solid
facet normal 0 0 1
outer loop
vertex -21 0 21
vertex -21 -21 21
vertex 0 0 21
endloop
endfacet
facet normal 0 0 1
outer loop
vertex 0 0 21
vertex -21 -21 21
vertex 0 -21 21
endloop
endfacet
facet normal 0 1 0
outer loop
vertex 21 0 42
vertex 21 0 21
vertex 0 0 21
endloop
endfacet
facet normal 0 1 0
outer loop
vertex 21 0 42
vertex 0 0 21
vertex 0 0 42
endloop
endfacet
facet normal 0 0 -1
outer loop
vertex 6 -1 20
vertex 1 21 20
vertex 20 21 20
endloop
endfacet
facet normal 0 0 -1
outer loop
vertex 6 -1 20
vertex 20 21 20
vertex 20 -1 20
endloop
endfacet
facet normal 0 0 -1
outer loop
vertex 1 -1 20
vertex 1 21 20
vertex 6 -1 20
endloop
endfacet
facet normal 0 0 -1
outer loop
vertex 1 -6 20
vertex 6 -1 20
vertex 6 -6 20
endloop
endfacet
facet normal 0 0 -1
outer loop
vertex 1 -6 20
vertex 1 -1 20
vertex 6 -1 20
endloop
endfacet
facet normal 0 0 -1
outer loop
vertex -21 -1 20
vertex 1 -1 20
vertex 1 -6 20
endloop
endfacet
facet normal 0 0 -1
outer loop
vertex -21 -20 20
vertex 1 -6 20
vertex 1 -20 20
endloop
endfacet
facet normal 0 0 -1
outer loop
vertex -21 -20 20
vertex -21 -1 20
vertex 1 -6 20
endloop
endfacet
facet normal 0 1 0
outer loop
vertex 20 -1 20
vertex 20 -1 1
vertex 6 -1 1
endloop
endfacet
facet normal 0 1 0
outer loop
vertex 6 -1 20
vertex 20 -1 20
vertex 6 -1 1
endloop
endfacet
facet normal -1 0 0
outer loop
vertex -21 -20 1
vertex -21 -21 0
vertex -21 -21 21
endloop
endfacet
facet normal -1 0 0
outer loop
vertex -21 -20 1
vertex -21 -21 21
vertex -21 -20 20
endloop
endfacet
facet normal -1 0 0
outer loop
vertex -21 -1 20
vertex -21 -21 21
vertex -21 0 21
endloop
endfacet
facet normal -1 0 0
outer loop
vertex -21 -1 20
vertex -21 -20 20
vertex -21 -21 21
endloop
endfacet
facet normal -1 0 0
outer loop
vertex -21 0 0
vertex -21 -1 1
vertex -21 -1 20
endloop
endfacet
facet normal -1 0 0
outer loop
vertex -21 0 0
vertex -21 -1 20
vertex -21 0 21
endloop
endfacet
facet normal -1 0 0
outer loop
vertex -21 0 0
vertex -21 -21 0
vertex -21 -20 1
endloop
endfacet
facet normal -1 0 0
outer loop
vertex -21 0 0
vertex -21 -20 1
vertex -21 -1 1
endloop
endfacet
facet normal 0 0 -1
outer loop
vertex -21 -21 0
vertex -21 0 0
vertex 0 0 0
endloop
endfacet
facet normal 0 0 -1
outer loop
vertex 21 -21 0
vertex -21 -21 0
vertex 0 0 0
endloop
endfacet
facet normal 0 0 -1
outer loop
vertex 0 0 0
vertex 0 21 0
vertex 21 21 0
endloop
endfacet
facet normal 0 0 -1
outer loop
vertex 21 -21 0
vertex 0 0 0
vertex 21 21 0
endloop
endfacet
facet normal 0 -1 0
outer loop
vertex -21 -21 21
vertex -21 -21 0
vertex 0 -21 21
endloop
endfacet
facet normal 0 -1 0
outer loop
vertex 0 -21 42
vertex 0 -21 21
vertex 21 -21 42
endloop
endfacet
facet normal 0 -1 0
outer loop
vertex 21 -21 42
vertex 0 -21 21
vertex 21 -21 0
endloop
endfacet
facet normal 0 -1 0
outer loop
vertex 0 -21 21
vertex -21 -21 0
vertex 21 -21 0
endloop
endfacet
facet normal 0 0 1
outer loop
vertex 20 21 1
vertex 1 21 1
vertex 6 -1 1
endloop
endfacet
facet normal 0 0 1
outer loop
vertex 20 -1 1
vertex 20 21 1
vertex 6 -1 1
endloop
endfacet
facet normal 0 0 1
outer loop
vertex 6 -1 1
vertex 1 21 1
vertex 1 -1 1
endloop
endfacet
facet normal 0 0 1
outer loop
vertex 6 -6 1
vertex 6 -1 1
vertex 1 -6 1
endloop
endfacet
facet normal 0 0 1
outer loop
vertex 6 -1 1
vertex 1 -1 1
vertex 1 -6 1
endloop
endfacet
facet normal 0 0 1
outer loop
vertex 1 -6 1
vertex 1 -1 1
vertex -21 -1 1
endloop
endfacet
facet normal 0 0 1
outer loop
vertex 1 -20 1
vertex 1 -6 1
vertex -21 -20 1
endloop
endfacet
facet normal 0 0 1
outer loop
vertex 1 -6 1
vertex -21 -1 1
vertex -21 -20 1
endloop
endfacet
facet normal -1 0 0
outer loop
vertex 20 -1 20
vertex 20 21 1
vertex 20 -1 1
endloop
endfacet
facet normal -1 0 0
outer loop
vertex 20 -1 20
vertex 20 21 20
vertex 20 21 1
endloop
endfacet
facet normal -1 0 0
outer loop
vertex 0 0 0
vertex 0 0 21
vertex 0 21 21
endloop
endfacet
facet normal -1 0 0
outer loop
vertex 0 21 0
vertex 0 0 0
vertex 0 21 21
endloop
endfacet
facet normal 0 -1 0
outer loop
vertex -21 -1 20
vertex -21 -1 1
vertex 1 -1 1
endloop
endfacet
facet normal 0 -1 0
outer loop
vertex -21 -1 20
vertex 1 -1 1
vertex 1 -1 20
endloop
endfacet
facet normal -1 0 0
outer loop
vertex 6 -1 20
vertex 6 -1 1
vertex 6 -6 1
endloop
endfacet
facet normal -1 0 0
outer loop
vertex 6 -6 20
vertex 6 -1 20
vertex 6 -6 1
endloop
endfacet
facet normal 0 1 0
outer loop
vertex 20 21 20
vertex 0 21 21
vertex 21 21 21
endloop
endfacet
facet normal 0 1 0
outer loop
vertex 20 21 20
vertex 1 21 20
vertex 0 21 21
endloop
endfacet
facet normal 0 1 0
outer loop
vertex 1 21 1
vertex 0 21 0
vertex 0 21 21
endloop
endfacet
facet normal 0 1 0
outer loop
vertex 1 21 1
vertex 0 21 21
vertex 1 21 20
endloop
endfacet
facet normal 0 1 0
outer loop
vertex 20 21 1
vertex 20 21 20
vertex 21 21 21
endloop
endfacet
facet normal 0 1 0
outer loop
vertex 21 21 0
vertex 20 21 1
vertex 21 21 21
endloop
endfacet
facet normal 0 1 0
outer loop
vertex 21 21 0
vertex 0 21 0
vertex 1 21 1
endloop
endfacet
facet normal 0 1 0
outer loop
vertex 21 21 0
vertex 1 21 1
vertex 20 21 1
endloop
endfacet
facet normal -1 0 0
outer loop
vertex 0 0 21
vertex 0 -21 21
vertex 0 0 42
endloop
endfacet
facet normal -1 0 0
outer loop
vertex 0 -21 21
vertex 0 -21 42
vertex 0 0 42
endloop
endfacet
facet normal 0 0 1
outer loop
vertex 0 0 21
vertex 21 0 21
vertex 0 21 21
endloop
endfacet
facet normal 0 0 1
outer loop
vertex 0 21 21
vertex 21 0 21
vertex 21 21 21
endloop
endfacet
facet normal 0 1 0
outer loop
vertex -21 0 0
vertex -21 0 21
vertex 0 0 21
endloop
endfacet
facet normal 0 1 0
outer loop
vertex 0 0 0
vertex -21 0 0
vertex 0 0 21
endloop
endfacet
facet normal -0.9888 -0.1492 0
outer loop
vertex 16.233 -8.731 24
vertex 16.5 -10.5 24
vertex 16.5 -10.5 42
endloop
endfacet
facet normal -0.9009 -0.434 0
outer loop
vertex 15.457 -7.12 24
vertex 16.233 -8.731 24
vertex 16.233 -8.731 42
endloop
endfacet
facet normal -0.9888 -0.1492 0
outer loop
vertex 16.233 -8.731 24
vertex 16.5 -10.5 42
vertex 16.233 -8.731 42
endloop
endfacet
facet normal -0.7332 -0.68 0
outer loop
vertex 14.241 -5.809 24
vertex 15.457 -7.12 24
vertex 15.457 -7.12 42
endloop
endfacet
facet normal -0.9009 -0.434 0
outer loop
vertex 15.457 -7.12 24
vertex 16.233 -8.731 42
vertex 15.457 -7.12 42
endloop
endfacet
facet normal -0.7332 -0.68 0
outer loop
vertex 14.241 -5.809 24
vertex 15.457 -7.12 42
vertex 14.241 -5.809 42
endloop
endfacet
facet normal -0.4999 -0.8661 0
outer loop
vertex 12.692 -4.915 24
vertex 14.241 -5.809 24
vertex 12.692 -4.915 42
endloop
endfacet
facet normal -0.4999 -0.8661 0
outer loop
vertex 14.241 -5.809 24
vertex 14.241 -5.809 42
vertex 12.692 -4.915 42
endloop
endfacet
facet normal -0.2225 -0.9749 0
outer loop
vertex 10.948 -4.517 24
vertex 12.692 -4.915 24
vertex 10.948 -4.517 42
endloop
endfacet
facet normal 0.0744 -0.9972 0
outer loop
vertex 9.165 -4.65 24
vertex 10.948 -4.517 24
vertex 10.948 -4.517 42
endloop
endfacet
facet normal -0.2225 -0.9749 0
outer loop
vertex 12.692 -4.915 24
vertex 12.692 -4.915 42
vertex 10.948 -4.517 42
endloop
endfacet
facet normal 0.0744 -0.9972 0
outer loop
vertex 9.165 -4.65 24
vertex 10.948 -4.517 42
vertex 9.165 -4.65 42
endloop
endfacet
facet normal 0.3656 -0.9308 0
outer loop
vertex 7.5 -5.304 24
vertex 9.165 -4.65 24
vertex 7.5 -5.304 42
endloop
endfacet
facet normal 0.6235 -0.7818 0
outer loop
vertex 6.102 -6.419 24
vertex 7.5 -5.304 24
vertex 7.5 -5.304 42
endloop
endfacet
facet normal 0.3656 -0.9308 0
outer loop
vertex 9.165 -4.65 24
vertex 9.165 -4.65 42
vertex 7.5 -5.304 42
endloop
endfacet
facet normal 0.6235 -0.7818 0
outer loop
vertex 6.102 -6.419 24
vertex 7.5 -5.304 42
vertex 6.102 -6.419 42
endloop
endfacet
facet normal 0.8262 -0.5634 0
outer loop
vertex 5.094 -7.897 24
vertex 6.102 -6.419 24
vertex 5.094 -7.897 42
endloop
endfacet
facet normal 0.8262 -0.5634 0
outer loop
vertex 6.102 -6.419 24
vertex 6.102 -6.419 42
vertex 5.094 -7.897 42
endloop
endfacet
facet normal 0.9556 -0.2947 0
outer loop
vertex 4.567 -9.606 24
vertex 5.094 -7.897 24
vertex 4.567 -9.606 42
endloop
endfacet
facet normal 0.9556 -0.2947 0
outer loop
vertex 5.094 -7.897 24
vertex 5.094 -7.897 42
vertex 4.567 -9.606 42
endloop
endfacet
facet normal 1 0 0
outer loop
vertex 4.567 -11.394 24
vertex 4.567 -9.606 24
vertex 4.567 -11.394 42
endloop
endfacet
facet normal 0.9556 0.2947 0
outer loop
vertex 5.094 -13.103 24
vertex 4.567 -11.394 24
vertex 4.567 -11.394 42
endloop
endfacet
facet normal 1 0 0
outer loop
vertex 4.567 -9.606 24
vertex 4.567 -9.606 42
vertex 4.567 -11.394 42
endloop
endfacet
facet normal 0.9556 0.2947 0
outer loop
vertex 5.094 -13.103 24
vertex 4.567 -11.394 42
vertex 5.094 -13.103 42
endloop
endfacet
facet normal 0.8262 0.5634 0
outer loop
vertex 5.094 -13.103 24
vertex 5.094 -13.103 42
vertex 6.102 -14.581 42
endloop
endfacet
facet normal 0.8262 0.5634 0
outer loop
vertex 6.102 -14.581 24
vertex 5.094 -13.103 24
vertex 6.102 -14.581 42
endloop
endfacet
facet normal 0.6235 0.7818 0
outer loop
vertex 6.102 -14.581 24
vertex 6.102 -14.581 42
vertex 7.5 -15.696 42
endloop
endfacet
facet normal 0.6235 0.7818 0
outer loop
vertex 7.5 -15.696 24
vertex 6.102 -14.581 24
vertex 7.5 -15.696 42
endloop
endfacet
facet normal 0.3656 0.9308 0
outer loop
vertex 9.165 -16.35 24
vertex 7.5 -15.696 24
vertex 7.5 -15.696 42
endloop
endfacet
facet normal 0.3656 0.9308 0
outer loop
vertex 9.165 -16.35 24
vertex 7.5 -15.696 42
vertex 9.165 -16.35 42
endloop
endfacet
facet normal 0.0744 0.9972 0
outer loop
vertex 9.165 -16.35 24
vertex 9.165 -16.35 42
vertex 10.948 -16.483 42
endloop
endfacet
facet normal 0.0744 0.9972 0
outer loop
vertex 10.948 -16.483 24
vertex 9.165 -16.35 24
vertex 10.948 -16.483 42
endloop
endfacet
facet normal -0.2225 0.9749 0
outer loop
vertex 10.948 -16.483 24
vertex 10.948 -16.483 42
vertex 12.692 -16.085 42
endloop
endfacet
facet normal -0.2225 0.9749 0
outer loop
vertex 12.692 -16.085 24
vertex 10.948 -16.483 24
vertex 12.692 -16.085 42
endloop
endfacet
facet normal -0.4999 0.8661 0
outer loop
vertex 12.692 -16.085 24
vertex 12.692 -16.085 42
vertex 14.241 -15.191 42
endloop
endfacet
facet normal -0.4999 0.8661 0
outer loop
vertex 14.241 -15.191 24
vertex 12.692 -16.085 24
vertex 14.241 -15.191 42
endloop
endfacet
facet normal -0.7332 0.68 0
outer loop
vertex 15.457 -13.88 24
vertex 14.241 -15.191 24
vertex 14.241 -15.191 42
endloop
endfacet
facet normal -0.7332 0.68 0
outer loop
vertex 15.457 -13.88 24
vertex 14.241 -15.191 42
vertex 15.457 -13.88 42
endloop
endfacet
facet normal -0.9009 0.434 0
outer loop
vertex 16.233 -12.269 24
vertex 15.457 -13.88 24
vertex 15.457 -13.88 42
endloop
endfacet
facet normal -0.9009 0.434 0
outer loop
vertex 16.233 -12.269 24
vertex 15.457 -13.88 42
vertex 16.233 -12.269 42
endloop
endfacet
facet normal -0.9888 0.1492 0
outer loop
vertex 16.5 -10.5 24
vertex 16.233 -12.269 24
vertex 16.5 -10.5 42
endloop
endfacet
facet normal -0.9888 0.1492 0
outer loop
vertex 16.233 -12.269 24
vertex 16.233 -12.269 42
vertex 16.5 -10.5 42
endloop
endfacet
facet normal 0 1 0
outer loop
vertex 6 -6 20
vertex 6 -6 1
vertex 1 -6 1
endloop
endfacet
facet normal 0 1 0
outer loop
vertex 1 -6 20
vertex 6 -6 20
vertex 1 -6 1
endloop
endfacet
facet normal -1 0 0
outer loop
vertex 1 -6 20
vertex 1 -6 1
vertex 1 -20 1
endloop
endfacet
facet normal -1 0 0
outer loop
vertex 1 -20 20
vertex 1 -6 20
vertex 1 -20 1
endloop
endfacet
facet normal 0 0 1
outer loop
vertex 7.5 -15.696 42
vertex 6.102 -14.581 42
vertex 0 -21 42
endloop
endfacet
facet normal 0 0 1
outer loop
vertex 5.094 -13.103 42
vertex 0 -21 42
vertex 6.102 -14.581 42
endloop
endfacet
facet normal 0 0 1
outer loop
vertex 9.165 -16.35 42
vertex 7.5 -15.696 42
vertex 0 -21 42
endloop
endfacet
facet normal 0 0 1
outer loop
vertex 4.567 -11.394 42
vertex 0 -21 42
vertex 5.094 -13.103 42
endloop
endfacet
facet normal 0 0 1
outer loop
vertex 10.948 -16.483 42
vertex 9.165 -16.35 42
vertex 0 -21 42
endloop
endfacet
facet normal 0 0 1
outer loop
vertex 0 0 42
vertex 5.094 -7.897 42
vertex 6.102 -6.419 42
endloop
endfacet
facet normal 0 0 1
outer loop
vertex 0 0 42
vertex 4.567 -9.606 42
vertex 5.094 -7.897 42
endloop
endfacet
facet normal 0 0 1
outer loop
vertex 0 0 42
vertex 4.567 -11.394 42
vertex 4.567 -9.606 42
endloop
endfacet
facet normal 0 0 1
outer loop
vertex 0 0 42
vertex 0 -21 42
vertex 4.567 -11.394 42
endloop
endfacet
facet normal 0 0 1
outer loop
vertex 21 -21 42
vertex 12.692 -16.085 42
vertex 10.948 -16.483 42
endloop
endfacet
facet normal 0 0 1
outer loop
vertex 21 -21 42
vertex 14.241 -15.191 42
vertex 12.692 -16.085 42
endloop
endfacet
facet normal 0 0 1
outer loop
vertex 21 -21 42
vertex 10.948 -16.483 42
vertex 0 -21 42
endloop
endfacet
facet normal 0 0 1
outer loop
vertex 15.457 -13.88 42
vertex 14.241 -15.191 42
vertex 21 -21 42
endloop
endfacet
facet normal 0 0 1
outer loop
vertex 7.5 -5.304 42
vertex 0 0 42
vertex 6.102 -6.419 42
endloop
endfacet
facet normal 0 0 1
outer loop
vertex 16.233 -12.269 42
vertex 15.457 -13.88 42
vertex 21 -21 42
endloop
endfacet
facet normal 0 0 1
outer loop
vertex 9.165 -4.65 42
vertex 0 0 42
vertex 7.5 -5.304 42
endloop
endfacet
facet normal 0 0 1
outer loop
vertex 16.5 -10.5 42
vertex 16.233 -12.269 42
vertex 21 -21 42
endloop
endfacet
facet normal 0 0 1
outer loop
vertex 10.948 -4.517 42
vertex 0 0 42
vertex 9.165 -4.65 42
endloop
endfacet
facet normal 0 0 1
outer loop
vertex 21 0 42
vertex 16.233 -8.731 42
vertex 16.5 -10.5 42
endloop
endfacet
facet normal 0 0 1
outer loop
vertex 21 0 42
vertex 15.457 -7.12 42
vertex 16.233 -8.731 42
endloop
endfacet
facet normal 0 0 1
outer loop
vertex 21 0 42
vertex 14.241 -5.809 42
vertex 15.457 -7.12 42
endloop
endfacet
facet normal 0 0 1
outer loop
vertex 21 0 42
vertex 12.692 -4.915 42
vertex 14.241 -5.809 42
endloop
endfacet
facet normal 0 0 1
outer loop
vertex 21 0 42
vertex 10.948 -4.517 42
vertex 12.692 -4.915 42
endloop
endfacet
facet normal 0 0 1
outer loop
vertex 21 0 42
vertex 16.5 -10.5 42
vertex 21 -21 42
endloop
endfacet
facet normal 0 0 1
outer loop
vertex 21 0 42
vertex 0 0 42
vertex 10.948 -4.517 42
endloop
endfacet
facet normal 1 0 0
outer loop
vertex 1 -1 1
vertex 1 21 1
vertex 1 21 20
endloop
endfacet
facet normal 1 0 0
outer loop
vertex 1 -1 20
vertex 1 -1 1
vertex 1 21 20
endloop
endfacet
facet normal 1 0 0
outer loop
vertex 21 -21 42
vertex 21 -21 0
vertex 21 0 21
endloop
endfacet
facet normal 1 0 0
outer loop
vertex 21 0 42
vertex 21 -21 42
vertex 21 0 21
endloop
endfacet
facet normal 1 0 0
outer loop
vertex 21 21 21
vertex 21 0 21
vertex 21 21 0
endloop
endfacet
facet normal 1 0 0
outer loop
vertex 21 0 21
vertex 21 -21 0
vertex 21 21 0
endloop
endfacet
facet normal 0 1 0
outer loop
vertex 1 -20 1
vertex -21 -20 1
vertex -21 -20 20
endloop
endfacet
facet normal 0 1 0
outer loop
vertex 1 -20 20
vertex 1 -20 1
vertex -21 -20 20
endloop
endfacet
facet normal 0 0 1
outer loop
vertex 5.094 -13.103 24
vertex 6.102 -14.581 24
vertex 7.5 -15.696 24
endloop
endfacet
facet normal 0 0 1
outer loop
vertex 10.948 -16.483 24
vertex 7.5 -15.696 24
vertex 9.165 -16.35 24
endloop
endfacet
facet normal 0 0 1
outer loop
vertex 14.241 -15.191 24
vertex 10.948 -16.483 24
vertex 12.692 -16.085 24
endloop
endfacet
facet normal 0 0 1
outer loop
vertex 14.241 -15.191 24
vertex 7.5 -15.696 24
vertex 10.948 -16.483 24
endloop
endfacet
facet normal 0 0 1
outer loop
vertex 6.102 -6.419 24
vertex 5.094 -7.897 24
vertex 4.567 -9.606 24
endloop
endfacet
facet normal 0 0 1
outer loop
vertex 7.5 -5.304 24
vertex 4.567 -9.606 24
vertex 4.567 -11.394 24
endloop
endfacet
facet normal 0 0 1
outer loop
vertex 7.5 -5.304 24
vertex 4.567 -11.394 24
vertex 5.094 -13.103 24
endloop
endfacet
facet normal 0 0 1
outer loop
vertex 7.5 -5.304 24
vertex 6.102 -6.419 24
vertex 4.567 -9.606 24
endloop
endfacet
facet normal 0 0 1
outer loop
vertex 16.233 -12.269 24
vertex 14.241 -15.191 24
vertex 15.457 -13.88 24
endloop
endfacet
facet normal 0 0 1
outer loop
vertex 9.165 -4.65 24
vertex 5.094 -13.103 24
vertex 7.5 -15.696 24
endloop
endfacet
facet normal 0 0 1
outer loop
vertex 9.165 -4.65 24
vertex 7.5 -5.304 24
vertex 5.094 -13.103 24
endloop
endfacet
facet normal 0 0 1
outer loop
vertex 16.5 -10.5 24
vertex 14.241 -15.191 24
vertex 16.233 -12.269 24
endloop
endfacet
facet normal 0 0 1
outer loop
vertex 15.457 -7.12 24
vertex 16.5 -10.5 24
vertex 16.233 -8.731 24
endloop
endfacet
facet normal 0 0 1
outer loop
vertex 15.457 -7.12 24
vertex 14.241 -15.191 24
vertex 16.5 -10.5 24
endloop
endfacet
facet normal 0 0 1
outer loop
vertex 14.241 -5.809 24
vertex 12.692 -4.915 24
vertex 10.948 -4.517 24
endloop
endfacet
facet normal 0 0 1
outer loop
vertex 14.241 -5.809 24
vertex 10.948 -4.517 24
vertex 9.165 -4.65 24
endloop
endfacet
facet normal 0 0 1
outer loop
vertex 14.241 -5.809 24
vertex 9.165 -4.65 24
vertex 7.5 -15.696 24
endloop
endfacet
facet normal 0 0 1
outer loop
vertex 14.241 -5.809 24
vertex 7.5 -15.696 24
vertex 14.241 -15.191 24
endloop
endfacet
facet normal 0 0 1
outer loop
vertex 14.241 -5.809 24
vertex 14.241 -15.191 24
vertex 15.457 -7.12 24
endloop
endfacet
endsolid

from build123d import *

# Parameters (mm, degrees)
F0_W      = 42
F0_H      = 42
F1_DEPTH  = 42
F2_W      = 21
F2_H      = 21
F3_DEPTH  = 42
F4_W      = 21
F4_H      = 21
F5_DEPTH  = 21
F6_W      = 21
F6_H      = 21
F7_DEPTH  = 21
F9_W      = 19
F9_H      = 19
F10_DEPTH = 41
F11_W     = 19
F11_H     = 19
F12_DEPTH = 22
F8_R      = 6
F13_DEPTH = 18
F15_DEPTH = 19


with BuildPart() as f1:
    # F0 (on Top) → F1 (new body)
    with BuildSketch(Plane.XY):
        Rectangle(F0_W, F0_H)
    extrude(amount=F1_DEPTH)

    # F2 (on face) → F3 (cut, through all)
    with BuildSketch(Plane.XY.offset(42)):
        with Locations((-10.5, 10.5)):
            Rectangle(F2_W, F2_H)
    extrude(amount=-F3_DEPTH, mode=Mode.SUBTRACT)

    # F4 (on face) → F5 (cut, through all)
    with BuildSketch(Plane.XZ.offset(21)):
        with Locations((-10.5, 31.5)):
            Rectangle(F4_W, F4_H)
    extrude(amount=-F5_DEPTH, mode=Mode.SUBTRACT)

    # F6 (on face) → F7 (cut, through all)
    with BuildSketch(Plane.YZ.offset(21)):
        with Locations((10.5, 31.5)):
            Rectangle(F6_W, F6_H)
    extrude(amount=-F7_DEPTH, mode=Mode.SUBTRACT)

    # F9 (on face) → F10 (cut)
    with BuildSketch(Plane(origin=(-21, 0, 0), x_dir=(0, -1, 0), z_dir=(-1, 0, 0))):
        with Locations((10.5, 10.5)):
            Rectangle(F9_W, F9_H)
    extrude(amount=-F10_DEPTH, mode=Mode.SUBTRACT)

    # F11 (on face) → F12 (cut)
    with BuildSketch(Plane(origin=(0, 21, 0), x_dir=(-1, 0, 0), z_dir=(0, 1, 0))):
        with Locations((-10.5, 10.5)):
            Rectangle(F11_W, F11_H)
    extrude(amount=-F12_DEPTH, mode=Mode.SUBTRACT)

    # F8 (on face) → F13 (cut)
    with BuildSketch(Plane.XY.offset(42)):
        with Locations((10.5, -10.5)):
            Circle(F8_R)
    extrude(amount=-F13_DEPTH, mode=Mode.SUBTRACT)

    # F14 (on face) → F15 (join, through all)
    with BuildSketch(Plane.XY.offset(1)):
        Polygon((20, -1), (6, -1), (6, -6), (1, -6), (1, -20), (20, -20), align=None)
    extrude(amount=F15_DEPTH)


solid = f1.part
